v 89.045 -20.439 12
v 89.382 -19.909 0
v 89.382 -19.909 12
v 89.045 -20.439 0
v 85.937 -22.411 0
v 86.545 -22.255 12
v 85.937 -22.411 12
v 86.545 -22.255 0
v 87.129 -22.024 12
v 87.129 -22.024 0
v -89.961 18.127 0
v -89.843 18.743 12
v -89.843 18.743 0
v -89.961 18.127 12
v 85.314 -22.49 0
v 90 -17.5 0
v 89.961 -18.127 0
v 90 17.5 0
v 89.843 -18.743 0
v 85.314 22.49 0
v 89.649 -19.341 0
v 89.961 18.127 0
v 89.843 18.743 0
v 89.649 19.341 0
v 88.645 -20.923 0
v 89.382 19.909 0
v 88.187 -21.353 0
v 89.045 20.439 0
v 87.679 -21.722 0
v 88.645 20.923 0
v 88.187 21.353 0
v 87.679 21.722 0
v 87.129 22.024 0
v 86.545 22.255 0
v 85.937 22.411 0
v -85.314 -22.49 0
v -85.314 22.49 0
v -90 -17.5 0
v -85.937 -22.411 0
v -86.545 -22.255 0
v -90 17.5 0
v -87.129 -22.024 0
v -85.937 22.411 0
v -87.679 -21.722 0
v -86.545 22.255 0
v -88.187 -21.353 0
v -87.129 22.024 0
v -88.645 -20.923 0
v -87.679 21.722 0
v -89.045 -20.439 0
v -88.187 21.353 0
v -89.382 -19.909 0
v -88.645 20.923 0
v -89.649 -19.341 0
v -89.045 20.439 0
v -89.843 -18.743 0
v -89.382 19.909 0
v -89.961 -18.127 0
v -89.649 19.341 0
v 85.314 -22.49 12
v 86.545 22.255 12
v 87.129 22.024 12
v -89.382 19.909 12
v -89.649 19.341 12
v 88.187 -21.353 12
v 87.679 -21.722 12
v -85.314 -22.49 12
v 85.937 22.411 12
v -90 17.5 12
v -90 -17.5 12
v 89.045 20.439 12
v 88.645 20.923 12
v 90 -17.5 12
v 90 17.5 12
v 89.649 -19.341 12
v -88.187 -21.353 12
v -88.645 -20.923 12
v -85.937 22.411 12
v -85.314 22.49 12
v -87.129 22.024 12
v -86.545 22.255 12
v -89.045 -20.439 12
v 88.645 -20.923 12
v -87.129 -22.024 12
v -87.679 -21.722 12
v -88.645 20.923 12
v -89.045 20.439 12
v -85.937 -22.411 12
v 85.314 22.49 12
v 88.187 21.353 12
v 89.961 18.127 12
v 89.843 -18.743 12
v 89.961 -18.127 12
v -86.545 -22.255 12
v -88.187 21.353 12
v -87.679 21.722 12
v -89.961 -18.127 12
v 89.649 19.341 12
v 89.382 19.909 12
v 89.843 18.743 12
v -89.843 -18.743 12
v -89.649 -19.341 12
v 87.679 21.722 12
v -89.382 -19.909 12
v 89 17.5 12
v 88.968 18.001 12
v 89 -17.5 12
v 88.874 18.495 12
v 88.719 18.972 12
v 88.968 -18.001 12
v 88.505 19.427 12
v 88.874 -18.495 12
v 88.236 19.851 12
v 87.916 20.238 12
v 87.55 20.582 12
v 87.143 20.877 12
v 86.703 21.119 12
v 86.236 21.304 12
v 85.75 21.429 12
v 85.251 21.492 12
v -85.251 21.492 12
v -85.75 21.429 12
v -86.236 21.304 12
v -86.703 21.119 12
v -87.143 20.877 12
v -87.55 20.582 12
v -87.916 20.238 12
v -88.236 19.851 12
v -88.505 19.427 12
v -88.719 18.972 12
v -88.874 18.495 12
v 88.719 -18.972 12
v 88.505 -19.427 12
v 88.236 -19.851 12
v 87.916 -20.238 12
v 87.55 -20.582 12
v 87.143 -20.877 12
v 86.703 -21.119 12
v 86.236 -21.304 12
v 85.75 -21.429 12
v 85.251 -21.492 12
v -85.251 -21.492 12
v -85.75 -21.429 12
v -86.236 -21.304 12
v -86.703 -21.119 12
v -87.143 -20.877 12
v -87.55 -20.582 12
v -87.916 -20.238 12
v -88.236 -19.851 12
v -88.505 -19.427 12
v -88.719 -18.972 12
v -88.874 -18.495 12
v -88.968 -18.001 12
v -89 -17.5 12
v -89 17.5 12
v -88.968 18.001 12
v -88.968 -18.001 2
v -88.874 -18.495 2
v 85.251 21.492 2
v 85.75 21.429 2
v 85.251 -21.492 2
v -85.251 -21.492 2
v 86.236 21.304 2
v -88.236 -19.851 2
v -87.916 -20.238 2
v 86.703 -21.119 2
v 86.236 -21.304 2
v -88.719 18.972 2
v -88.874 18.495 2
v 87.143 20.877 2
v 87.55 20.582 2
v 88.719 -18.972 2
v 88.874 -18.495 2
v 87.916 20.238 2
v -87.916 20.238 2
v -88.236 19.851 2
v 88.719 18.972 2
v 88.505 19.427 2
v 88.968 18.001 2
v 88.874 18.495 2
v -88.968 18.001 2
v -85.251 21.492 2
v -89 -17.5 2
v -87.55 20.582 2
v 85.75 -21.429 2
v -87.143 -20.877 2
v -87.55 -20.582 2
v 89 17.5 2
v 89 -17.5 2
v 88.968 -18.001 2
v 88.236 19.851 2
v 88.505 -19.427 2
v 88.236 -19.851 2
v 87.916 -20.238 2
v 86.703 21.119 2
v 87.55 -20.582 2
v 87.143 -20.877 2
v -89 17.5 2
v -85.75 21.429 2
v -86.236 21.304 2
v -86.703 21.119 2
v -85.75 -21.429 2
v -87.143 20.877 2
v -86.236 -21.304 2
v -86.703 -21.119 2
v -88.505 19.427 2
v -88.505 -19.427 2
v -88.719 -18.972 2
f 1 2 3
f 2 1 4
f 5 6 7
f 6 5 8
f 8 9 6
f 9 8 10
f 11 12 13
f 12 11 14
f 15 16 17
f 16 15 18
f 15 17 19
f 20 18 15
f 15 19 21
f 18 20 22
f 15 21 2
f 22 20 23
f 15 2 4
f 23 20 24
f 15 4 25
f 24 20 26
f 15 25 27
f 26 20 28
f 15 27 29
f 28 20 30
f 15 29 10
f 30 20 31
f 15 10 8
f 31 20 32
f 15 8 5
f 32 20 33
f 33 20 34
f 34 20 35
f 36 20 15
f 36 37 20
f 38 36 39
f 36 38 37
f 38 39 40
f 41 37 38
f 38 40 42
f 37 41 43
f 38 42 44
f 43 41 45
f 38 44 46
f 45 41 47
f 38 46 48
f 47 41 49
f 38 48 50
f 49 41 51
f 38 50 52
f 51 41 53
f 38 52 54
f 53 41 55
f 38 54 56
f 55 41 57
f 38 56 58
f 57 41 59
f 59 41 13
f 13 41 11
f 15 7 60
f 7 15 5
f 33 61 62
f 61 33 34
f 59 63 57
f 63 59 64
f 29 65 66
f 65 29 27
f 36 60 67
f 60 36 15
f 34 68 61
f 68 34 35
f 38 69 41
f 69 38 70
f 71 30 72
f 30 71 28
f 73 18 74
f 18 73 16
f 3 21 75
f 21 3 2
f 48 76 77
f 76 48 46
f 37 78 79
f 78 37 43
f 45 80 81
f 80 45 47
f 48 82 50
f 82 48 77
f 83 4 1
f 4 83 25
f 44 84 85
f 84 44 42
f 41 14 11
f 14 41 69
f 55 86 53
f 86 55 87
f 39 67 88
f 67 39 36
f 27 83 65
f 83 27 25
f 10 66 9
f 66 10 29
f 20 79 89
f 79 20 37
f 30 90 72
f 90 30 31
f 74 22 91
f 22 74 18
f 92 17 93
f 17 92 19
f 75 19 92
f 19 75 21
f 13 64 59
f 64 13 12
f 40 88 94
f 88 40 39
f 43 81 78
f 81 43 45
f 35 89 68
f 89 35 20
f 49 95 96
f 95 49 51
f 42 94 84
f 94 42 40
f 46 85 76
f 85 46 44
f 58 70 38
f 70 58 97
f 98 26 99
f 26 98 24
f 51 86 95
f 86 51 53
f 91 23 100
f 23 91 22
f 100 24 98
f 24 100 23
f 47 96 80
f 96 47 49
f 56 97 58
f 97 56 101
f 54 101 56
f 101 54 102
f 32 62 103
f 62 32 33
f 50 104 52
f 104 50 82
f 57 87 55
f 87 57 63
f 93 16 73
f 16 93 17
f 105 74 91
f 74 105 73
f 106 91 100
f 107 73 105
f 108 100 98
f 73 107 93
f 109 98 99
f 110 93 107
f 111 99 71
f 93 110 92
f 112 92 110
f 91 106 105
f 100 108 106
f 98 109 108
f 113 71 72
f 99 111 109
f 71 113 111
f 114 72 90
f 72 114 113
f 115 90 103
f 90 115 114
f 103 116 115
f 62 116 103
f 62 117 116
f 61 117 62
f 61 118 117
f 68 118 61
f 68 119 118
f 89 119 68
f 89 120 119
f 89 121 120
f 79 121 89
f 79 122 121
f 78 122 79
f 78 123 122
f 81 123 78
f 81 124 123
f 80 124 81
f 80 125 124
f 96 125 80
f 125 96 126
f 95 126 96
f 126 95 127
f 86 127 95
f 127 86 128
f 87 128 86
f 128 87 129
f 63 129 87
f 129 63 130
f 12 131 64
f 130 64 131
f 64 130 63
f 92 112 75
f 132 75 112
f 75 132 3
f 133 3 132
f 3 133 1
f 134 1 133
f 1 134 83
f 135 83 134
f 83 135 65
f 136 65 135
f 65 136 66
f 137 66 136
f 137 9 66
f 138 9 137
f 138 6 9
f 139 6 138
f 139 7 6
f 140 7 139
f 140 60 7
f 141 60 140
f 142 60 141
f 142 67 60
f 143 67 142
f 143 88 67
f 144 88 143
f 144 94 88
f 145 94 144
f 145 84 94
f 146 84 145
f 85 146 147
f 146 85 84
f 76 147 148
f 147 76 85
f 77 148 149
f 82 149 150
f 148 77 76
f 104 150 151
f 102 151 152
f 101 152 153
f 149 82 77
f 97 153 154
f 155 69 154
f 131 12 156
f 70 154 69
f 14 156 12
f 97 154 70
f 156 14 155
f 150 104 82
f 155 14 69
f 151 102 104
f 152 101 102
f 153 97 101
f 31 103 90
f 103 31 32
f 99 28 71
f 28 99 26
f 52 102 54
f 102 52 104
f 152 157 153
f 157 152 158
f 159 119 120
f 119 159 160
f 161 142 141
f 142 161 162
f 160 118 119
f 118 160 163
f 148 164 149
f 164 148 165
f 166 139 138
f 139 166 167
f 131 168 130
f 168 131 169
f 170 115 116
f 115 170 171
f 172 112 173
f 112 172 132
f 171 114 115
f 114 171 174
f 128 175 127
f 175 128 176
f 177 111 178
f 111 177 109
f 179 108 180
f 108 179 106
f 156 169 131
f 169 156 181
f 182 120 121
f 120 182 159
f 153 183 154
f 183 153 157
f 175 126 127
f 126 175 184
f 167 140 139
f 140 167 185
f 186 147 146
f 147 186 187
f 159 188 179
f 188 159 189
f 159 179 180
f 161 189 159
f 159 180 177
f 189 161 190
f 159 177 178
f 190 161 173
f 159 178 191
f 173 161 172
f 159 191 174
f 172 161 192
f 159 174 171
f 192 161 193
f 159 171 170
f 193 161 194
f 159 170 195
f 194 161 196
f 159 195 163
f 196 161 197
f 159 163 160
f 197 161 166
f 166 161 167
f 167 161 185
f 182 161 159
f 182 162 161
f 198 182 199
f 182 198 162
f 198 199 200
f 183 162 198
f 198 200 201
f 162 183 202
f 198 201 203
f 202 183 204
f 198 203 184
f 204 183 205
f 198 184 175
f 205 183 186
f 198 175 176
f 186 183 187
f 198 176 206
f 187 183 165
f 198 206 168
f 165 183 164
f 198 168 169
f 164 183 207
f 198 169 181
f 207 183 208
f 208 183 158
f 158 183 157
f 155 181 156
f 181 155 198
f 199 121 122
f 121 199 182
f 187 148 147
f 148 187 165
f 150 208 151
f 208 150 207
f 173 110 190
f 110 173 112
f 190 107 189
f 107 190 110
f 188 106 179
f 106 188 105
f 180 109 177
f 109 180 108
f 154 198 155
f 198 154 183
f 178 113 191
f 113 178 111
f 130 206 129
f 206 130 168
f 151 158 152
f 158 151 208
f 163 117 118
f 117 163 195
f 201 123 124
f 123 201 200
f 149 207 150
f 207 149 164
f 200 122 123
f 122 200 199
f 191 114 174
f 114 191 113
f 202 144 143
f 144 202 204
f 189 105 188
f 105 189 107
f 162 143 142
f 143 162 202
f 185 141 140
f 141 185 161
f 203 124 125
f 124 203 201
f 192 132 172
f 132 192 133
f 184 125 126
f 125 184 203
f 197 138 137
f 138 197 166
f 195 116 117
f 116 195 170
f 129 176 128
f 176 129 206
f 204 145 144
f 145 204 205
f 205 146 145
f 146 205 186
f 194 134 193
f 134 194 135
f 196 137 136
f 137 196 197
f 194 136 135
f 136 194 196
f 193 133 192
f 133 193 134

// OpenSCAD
$fn = 50;


difference() {
	union() {
		hull() {
			translate(v = [-85.0000000000, 17.5000000000, 0]) {
				cylinder(h = 12, r = 5);
			}
			translate(v = [85.0000000000, 17.5000000000, 0]) {
				cylinder(h = 12, r = 5);
			}
			translate(v = [-85.0000000000, -17.5000000000, 0]) {
				cylinder(h = 12, r = 5);
			}
			translate(v = [85.0000000000, -17.5000000000, 0]) {
				cylinder(h = 12, r = 5);
			}
		}
	}
	union() {
		translate(v = [0, 0, 2]) {
			hull() {
				translate(v = [-85.0000000000, 17.5000000000, 0]) {
					cylinder(h = 10, r = 4);
				}
				translate(v = [85.0000000000, 17.5000000000, 0]) {
					cylinder(h = 10, r = 4);
				}
				translate(v = [-85.0000000000, -17.5000000000, 0]) {
					cylinder(h = 10, r = 4);
				}
				translate(v = [85.0000000000, -17.5000000000, 0]) {
					cylinder(h = 10, r = 4);
				}
			}
		}
	}
}
